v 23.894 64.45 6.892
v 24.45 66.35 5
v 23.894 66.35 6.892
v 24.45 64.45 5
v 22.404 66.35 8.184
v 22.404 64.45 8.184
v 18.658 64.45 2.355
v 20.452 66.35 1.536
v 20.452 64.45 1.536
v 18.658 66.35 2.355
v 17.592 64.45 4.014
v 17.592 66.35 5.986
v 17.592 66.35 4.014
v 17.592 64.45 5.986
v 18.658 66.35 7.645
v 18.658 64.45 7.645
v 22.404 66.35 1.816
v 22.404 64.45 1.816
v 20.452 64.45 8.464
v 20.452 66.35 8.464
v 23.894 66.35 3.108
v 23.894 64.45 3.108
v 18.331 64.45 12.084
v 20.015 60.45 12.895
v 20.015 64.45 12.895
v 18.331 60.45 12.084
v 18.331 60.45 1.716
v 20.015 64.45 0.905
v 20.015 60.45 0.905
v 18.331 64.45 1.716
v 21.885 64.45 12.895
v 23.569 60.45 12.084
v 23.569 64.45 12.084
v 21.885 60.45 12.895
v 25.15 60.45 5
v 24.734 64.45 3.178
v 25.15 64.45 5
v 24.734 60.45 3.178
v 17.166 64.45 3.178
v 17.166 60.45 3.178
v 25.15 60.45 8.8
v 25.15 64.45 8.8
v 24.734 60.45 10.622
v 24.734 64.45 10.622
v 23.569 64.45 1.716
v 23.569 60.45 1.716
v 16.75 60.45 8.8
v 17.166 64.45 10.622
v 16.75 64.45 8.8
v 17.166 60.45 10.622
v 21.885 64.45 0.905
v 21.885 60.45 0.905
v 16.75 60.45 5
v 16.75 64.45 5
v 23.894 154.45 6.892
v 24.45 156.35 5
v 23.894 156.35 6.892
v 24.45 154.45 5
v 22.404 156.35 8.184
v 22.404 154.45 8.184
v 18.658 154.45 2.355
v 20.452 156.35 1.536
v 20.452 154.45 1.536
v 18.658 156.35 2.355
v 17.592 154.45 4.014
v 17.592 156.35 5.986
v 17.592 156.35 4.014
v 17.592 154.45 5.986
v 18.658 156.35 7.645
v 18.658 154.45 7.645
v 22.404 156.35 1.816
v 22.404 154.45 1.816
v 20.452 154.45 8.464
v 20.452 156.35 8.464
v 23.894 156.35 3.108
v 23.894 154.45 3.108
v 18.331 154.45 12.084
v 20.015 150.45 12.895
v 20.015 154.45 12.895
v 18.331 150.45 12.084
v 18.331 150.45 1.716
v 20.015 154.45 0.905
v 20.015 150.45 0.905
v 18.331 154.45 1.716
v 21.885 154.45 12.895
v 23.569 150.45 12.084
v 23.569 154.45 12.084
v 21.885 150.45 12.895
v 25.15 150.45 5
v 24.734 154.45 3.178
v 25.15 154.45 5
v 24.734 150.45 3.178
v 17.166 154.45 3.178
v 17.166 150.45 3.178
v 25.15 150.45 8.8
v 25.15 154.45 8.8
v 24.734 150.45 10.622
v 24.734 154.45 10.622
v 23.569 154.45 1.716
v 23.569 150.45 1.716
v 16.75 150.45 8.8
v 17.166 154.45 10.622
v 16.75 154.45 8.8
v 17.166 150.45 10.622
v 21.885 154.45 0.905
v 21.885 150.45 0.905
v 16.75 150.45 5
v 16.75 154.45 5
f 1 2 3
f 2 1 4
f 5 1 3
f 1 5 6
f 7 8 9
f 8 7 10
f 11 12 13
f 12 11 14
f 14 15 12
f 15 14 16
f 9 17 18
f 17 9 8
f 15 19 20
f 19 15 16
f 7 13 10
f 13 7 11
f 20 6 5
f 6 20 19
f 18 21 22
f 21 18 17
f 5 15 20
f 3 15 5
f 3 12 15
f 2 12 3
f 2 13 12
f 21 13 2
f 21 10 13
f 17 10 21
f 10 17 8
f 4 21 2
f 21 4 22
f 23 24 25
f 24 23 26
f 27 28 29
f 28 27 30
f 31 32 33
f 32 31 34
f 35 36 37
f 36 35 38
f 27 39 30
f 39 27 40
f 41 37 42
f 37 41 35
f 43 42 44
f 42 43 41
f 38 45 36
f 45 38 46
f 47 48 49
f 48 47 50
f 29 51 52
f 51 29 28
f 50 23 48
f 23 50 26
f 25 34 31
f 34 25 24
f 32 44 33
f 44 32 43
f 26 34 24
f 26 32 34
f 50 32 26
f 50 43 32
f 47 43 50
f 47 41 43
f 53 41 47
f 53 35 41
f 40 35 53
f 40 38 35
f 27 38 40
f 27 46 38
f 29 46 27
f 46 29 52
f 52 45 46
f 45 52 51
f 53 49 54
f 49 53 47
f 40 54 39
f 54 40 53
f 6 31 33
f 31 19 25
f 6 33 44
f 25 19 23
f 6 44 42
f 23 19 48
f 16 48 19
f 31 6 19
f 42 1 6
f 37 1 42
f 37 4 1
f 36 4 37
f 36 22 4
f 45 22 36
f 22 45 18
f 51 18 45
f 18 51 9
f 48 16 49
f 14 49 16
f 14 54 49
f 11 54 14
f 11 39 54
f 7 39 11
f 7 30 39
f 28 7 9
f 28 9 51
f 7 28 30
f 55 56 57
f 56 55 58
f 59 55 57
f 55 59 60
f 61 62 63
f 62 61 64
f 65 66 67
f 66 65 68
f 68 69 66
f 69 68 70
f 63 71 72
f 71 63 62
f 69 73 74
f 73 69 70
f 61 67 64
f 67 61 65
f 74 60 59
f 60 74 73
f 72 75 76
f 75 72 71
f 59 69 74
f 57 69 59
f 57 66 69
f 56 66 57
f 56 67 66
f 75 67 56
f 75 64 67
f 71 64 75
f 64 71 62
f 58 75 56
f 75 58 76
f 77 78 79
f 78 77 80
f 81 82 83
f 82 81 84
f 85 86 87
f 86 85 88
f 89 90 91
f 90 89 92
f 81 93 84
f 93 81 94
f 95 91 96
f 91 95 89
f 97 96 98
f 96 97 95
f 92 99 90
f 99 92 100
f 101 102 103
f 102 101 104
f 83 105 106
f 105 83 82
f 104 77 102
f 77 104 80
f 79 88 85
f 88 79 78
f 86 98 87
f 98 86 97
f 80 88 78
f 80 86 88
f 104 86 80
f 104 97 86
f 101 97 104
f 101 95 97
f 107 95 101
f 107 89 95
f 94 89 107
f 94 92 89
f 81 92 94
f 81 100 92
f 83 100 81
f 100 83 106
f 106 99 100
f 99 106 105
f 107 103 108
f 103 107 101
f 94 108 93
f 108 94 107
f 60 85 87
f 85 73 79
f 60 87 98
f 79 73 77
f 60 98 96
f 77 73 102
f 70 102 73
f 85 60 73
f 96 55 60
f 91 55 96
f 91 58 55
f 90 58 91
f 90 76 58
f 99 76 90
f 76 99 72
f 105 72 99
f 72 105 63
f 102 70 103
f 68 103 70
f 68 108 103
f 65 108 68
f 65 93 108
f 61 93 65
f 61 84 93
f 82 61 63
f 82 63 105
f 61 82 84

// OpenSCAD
// file: PiDimensions.scad
// Dimensions for raspberry Pis

hole_offset = 3.5;
e = 0.001;

// gap between board and walls (y)
gap = 0.4;

outer_radius = 7;
inner_radius = 1;

// thickness of sides
top_thick = 1.2;
side_thick = 1.2;
hat_height = 17;
sweep_height = 10;

standoff_height = 7;
standoff_radius = 3;

corner_support_radius = 5.5;
corner_support_hole = 3;
corner_space_left = 2 * corner_support_radius;


pin_height = 2;

pin_radius = 1.1;


thickness = 1.2; // mm for board

split = top_thick
    +standoff_height
    +thickness
    +8;


// width
// depth

NAME=0;
WIDTH=1;
DEPTH=2;
HEIGHT=3;
HATS=9;
SPACE_LEFT = 10;
SPACE_RIGHT = 11;

// https://www.raspberrypi.org/documentation/hardware/raspberrypi/mechanical/rpi_MECH_3aplus.pdf

function params_pi3A() = [
  "Pi3A",
  65+.10, /* width */
  56+.10, /* depth */
  12,     /* height of highest point */
  10.6,   /* center of USB for power */
  10.6,   /* center of second USB (if none use same) */
  32.0,   /* hdmi offset */
  17.0,   /* hdmi width */
   8.0,   /* hdmi height */
   1.0,   /* hats */
   6.0,   /* space left */
   6.0,   /* space right */
];

function params_pi3B() = [
  "Pi3B",
  65+.10, /* width */
  56+.10, /* depth */
  12.0,   /* height of highest point */
  10.6,   /* center of USB for power */
  10.6,   /* center of second USB (if none use same) */
  32.0,   /* hdmi offset */
  17.0,   /* hdmi width */
   8.0,   /* hdmi height */
   1.0,   /* hats */
   6.0,   /* space left */
   16.0,  /* space right */
];

function params_piW() = [
  "PiW",
  65+.10, /* width */
  30+.10, /* depth */
  12.0,     /* height of highest point */
  54,     /* center of USB for power */
  41.4,   /* center of second USB (if none use same) */
  12.4,   /* hdmi offset */
  15.0,   /* hdmi width */
   7.0,   /* hdmi height */
   1.0,   /* hats */
   6.0,   /* space left */
   6.0,   /* space right */
];

function examples() = [
  [0, params_piW(), "red"],
  [90, params_pi3A(), "green"],
  [180, params_pi3B(), "blue"]
];

// use in a loop
//for (ex = examples())
//    translate([0,ex[0],0])
//    usb_plus(ex[1]);


// Sweeps a connector up to clear a path for it
module sweep(h=0)
{
   hull()
   {
       children();
       translate([0,0,sweep_height-h])
       children();
   }
}
// main file
// Pi Audio
include <PiDimensions.scad>;


module audio(params)
{
    width = params[1];
    depth = params[2];
    height = params[3];

  if (params[0] != "PiW")
  {
      // audio plug  
      translate([
      -width/2+53.5,
      -gap-depth/2+3,
      5])
      rotate([90,0,0])
      cylinder(3*side_thick,3.5,3.5, center=true);
        
      // audio socket
      translate([-width/2+53.5,
      -gap-depth/2-side_thick/2+1.5,
      5])
      sweep(4.2+2)
      rotate([90,0,0])
      cylinder(4,4.2,4.2, center=true);
      ;
      
  }
}

for (ex = examples())
    translate([0,ex[0],0])
    audio(ex[1]);
